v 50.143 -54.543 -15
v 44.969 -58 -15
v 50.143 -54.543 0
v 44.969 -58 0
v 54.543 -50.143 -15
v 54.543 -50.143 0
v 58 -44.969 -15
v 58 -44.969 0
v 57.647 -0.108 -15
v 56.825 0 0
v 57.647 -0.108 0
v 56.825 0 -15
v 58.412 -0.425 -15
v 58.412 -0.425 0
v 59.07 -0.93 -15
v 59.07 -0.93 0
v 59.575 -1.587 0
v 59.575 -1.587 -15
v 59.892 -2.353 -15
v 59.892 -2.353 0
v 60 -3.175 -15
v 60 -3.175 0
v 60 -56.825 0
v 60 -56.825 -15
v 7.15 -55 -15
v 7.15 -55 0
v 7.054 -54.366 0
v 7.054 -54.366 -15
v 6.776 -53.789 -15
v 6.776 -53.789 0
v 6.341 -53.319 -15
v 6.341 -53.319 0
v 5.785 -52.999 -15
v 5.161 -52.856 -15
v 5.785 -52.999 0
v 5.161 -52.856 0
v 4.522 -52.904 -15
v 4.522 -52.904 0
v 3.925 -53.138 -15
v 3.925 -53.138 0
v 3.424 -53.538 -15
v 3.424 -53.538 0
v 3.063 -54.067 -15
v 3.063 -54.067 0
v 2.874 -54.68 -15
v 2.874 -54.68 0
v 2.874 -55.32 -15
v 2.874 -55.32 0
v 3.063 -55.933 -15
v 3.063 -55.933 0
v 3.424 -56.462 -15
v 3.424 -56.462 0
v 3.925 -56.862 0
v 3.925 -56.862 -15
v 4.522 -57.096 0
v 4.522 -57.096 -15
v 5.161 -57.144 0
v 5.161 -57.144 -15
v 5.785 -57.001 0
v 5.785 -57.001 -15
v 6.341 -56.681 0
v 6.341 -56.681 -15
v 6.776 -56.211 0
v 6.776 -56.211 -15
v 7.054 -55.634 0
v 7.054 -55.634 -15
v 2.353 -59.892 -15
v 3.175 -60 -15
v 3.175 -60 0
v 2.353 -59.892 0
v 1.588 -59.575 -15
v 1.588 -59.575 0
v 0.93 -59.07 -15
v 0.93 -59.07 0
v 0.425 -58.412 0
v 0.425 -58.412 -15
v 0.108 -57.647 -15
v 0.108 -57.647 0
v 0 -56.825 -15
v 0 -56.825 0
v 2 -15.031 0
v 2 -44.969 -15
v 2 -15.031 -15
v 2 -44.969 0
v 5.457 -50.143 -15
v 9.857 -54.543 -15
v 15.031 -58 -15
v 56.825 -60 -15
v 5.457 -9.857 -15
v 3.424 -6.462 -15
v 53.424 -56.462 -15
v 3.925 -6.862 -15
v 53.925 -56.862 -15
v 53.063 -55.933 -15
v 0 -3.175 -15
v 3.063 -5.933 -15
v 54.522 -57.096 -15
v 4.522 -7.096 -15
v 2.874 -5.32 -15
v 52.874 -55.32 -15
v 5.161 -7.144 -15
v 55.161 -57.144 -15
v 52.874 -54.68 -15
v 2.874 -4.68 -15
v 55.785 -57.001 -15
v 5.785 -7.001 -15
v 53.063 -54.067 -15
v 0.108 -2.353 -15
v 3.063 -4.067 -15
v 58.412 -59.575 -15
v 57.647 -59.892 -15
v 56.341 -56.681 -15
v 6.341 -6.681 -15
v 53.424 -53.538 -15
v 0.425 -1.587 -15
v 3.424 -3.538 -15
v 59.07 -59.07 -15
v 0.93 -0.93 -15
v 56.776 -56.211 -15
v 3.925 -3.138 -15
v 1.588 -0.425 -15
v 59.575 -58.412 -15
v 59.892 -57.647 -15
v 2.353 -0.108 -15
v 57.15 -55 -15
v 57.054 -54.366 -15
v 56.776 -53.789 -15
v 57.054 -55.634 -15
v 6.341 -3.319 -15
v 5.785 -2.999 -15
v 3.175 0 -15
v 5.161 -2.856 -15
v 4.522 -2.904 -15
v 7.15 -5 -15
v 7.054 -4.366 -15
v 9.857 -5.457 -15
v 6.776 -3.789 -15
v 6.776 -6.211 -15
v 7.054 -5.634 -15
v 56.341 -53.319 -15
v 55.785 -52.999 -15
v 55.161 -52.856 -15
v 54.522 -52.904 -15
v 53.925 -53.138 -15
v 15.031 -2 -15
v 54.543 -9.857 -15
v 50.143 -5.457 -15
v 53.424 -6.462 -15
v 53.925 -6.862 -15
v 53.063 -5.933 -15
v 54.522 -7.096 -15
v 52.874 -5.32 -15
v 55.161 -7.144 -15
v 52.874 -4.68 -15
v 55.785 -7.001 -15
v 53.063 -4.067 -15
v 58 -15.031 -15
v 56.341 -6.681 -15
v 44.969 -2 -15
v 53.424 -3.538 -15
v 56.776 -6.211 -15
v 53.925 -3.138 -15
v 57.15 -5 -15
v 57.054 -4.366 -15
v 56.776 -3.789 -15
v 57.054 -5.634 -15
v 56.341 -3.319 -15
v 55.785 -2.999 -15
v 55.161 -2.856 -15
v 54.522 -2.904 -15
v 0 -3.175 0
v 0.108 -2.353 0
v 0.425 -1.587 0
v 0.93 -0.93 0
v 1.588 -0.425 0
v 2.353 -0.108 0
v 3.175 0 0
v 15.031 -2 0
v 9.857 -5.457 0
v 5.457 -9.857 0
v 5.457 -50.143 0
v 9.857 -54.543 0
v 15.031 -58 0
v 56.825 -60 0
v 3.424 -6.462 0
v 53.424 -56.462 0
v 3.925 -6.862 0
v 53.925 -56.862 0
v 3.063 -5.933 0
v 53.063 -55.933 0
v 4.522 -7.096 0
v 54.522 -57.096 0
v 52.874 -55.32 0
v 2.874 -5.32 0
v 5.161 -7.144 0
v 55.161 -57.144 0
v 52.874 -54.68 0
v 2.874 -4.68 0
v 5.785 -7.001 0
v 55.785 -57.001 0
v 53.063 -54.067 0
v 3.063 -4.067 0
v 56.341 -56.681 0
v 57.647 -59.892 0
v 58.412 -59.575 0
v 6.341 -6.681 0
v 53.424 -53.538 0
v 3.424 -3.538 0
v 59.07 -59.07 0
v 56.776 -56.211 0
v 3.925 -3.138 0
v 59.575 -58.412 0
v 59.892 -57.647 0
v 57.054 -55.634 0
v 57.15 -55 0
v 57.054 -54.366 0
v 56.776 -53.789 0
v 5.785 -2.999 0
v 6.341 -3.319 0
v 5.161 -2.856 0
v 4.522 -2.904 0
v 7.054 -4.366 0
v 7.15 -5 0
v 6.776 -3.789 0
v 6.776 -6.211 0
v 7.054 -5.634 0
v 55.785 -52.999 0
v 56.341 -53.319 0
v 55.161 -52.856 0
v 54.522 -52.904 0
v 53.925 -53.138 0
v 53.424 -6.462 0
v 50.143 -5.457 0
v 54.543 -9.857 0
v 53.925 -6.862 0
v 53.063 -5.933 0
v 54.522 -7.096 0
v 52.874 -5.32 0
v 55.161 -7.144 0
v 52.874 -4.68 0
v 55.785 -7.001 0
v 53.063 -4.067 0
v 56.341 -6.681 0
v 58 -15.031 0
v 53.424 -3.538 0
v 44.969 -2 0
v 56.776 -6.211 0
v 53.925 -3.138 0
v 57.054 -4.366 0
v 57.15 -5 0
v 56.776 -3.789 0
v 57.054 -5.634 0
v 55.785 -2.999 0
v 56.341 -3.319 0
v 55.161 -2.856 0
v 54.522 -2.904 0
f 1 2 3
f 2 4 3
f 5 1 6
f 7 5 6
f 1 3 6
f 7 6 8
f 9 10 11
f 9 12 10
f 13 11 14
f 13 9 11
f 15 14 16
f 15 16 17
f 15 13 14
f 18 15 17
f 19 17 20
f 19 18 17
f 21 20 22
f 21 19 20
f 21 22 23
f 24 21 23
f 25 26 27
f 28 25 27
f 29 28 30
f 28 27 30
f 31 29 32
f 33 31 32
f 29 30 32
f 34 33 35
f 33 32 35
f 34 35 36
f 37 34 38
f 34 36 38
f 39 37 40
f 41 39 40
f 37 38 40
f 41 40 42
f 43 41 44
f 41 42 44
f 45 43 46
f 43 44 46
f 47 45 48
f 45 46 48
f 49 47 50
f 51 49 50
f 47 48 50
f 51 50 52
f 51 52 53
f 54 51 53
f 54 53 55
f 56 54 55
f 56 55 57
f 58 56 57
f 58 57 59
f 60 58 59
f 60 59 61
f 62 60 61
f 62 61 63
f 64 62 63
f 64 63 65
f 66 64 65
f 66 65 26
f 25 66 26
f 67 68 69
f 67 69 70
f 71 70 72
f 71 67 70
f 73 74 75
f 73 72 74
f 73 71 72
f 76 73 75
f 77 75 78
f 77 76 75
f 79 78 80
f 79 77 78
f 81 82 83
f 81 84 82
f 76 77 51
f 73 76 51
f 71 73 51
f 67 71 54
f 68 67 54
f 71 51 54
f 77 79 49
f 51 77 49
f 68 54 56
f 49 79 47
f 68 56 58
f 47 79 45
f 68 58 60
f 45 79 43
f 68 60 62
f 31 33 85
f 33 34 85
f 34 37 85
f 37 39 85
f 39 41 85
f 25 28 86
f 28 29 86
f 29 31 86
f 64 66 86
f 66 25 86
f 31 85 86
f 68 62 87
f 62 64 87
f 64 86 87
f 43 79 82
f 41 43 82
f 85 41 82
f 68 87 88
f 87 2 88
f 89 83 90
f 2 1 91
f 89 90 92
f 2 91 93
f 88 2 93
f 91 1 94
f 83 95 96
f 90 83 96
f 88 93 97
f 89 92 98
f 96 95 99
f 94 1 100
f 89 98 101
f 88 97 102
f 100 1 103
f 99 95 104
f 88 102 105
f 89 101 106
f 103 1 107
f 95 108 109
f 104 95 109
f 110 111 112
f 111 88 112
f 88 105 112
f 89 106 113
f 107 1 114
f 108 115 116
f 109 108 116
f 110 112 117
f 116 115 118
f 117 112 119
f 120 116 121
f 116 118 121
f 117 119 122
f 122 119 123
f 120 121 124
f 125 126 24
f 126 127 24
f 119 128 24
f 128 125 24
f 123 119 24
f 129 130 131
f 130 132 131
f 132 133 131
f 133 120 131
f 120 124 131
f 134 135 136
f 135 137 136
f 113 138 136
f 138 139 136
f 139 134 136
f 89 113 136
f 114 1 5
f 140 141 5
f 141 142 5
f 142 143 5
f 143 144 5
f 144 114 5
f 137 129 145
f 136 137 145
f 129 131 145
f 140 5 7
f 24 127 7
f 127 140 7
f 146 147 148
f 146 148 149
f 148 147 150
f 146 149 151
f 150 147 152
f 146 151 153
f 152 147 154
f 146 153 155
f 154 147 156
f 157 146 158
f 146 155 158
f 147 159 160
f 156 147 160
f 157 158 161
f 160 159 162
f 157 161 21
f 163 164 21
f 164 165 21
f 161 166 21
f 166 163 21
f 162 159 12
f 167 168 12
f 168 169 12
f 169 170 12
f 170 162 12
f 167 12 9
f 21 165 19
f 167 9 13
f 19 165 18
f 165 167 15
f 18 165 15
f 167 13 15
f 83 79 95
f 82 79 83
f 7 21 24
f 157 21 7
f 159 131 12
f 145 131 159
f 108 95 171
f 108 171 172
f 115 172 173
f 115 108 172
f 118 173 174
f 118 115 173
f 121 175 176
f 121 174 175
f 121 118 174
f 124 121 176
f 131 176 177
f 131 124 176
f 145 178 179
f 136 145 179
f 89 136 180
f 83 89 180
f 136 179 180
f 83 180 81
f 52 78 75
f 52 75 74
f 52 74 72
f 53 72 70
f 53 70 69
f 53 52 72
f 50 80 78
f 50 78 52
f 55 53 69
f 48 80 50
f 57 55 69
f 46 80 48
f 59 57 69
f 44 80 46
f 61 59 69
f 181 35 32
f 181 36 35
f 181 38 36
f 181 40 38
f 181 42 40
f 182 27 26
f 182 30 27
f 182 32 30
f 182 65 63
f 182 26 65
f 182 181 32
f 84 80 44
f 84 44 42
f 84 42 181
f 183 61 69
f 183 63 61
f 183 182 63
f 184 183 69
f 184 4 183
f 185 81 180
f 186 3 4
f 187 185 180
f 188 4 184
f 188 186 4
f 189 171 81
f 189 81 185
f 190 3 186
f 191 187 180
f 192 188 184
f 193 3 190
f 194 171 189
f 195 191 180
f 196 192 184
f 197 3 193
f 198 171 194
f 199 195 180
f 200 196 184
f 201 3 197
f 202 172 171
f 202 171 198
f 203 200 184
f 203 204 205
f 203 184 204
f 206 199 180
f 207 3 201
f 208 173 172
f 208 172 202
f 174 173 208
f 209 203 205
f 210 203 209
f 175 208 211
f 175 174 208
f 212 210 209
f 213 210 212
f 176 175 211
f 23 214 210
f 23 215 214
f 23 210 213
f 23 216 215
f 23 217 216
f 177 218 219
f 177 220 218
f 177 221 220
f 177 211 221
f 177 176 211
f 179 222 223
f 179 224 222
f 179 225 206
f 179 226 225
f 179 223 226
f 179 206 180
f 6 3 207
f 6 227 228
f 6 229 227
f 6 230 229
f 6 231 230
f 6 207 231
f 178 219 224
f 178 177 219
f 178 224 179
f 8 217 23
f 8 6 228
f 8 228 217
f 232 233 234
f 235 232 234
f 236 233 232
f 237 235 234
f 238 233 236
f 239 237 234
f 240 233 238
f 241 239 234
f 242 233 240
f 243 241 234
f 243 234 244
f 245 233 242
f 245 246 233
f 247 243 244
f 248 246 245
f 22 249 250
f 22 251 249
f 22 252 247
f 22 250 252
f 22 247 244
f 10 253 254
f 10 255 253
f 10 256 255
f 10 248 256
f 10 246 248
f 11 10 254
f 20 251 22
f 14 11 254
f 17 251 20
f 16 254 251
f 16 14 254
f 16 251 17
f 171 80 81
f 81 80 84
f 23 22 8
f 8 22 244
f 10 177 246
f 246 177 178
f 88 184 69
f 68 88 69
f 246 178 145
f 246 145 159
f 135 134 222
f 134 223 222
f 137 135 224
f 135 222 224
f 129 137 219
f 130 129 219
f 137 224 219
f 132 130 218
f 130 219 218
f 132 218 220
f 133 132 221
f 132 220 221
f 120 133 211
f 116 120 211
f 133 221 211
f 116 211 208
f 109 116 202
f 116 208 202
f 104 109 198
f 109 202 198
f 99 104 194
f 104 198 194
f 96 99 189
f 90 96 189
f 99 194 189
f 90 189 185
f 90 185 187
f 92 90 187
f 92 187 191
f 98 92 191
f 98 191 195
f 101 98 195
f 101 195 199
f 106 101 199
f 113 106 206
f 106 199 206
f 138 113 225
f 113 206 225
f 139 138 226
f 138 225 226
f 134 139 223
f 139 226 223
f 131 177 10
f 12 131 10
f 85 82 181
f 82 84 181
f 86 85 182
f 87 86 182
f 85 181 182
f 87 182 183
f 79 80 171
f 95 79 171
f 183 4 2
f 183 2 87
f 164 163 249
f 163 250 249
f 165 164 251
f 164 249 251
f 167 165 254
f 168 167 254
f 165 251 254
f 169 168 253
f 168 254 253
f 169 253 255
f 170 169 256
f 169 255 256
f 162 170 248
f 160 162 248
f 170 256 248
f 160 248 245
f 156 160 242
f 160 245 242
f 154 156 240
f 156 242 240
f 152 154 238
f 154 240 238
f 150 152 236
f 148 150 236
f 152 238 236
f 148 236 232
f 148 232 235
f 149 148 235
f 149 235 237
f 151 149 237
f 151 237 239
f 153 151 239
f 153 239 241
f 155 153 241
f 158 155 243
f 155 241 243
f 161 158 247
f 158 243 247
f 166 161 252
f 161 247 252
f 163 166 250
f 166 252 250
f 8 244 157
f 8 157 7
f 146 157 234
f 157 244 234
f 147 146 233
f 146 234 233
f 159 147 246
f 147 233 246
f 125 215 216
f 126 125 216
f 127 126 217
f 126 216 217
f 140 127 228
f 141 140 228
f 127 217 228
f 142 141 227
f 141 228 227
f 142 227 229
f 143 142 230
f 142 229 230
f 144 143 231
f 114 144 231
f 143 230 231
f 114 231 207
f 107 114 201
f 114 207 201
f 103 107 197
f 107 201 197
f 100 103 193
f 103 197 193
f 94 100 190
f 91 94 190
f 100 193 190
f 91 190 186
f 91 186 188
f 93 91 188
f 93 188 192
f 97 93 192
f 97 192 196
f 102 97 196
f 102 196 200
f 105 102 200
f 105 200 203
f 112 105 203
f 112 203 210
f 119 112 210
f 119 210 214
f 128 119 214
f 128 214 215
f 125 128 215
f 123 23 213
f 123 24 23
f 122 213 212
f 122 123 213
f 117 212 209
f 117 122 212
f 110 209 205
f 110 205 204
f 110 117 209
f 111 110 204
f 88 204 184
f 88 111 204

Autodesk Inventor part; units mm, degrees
ref_plane "YZ Plane" through (0, 0, 0) normal (1, 0, 0) x (0, 1, 0)
ref_plane "XZ Plane" through (0, 0, 0) normal (0, 1, 0) x (-1, 0, 0)
ref_plane "XY Plane" through (0, 0, 0) normal (0, 0, 1) x (1, 0, 0)
sketch "Sketch1" plane through (0, 0, 0) normal (0, 0, 1) x (1, 0, 0)
  line L0 (0, 0) -> (60, 0)
  line L1 (60, 0) -> (60, -60)
  line L2 (60, -60) -> (0, -60)
  line L3 (0, -60) -> (0, 0)
  dimension "d0" = 60
  dimension "d1" = 60
extrude "Extrusion1" add sketch "Sketch1" against normal blind 15
sketch "Sketch2" plane through (0, 0, 0) normal (0, 0, 1) x (1, 0, 0)
  line L0 (0, 0) -> (60, 0) projected
  line L1 (0, -60) -> (0, 0) projected
  line L2 (60, -60) -> (0, -60) projected
  line L3 (60, 0) -> (60, -60) projected
  circle A0 centre (5, -5) radius 2.15
  circle A1 centre (55, -5) radius 2.15
  circle A2 centre (55, -55) radius 2.15
  circle A3 centre (5, -55) radius 2.15
  dimension "d5" = 4.3
  dimension "d6" = 4.3
  dimension "d7" = 4.3
  dimension "d8" = 4.3
  dimension "d9" = 50
  dimension "d10" = 50
  dimension "d11" = 5
  dimension "d12" = 5
extrude "Extrusion2" cut sketch "Sketch2" against normal up to next contours A0 | A1 | A2 | A3
sketch "Sketch3" plane through (0, 0, 0) normal (0, 0, 1) x (1, 0, 0)
  circle A0 centre (55, -55) radius 2.15 projected
  circle A1 centre (5, -5) radius 2.15 projected
  circle A2 centre (55, -5) radius 2.15 projected
  circle A3 centre (5, -55) radius 2.15 projected
  line L0 (0, 0) -> (60, 0) projected
  line L1 (0, -60) -> (0, 0) projected
  line L2 (60, -60) -> (0, -60) projected
  line L3 (60, 0) -> (60, -60) projected
  line L4 (15.0313, -2) -> (44.9687, -2)
  line L5 (2, -44.9687) -> (2, -15.0313)
  line L6 (44.9687, -58) -> (15.0313, -58)
  line L7 (58, -15.0313) -> (58, -44.9687)
  arc A4 (15.0313, -2) -> (2, -15.0313) centre (30, -30) ccw
  arc A5 (2, -44.9687) -> (15.0313, -58) centre (30, -30) ccw
  arc A6 (44.9687, -58) -> (58, -44.9687) centre (30, -30) ccw
  arc A7 (58, -15.0313) -> (44.9687, -2) centre (30, -30) ccw
  dimension "d23" = 360
  dimension "d16" = 60
  dimension "d17" = 30
  dimension "d18" = 30
  dimension "d20" = 2
extrude "Extrusion3" cut sketch "Sketch3" against normal up to next contours L4 A7 L7 A6 L6 A5 L5 A4
fillet "Fillet2" radius 3.175 4 edges at (0, 0, -7.5) (0, -60, -7.5) (60, -60, -7.5) (60, 0, -7.5)
equation "\"d1\" = d0"
equation "\"d6\" = d5"
equation "\"d7\" = d5"
equation "\"d8\" = d5"
equation "\"d10\" = d9"
equation "\"d12\" = d11"
equation "\"d17\" = 0.5 * d16"
equation "\"d18\" = d17"
properties part number "60mm Fan Footprint" material "ABS Plastic"
